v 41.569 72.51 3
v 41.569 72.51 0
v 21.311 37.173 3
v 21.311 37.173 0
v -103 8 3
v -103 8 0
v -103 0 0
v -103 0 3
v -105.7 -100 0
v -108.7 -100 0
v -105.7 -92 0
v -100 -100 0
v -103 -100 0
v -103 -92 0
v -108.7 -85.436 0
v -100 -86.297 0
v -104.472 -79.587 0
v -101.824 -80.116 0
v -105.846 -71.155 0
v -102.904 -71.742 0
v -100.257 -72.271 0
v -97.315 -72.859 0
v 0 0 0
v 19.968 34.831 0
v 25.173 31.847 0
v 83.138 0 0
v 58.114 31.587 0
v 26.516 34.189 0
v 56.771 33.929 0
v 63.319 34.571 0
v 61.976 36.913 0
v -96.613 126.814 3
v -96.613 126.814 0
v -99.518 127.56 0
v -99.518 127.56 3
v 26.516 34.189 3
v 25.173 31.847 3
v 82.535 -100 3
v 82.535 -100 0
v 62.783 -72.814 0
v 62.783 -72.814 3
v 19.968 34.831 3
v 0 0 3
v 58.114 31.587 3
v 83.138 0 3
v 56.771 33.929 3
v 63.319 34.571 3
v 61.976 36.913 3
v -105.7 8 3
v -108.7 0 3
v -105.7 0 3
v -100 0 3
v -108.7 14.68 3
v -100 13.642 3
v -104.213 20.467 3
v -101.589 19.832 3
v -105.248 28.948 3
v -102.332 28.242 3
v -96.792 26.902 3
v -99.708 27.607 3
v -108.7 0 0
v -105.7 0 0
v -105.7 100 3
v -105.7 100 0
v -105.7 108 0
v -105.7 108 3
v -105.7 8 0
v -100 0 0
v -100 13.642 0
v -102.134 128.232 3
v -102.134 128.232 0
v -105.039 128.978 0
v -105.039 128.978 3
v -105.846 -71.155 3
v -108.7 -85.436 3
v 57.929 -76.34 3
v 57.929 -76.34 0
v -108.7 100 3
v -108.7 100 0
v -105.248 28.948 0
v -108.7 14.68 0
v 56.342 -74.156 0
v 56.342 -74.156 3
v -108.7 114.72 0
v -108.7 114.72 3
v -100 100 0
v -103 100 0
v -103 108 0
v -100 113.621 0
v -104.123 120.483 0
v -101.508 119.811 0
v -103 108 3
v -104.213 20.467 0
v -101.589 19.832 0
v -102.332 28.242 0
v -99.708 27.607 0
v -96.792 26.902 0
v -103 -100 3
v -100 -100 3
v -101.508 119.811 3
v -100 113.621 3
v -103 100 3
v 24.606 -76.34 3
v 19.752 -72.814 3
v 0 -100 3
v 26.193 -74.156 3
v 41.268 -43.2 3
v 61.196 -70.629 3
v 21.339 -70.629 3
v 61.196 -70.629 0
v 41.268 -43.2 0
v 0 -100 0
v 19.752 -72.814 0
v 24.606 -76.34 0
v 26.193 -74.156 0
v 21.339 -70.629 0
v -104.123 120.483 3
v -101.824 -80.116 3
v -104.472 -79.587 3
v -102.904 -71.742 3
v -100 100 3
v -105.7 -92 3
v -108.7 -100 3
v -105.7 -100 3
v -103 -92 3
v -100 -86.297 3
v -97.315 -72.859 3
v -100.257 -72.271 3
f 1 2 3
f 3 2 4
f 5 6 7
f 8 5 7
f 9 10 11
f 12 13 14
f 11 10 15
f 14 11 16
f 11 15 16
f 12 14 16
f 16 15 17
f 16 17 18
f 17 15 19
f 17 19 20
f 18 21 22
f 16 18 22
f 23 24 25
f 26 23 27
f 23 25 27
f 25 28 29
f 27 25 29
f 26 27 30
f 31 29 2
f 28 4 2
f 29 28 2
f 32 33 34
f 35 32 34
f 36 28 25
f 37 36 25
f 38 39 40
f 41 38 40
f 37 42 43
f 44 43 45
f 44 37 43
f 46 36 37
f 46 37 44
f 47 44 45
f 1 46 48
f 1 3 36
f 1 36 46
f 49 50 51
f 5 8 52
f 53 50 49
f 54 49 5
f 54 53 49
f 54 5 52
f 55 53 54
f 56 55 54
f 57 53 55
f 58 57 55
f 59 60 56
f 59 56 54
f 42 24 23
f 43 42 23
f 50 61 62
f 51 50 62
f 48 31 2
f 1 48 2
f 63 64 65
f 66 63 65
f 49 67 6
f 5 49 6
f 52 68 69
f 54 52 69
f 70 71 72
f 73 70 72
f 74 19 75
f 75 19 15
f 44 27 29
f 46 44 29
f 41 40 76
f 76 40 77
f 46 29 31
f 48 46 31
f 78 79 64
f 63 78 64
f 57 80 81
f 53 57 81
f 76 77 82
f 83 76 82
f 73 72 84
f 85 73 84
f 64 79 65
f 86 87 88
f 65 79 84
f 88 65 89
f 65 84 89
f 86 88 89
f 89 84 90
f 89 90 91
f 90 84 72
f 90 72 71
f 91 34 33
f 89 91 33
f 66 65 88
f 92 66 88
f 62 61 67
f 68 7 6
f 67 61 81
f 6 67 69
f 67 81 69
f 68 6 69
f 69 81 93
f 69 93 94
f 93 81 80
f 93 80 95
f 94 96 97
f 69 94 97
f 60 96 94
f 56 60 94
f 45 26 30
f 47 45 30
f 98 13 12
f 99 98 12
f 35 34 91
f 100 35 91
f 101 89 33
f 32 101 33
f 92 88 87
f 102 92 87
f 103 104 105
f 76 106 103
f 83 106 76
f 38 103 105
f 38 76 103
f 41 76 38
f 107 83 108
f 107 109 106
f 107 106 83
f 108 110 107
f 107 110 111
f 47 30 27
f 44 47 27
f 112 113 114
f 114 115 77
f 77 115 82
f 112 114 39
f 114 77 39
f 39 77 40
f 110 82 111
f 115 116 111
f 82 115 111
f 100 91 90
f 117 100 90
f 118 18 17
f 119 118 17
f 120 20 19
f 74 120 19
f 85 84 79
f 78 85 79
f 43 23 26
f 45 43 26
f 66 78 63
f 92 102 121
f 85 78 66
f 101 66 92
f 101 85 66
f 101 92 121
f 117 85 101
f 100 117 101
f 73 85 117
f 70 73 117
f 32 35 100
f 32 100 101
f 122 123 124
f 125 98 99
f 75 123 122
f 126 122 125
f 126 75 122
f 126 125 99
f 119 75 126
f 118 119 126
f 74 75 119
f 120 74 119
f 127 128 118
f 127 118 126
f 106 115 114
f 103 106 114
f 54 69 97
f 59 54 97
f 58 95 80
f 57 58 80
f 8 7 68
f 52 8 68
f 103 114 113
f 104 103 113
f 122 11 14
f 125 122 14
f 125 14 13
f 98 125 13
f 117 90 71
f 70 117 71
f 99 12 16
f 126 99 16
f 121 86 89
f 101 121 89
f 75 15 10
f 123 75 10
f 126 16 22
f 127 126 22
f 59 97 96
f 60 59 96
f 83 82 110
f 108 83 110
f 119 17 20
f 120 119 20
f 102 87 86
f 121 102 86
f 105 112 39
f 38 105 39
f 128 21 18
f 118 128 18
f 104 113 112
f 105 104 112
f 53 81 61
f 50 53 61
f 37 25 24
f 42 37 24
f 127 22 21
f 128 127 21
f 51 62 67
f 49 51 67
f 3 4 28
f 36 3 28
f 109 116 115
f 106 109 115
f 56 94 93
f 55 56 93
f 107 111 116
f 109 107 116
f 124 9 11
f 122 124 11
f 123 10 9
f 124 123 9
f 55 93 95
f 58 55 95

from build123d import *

# Parameters (mm, degrees)
F2_DEPTH  = 3
F4_DEPTH  = 3
F6_DEPTH  = 3
F8_DEPTH  = 3
F10_DEPTH = 3


with BuildPart() as f2:
    # F1 (on Top) → F2 (new body)
    with BuildSketch(Plane.XY):
        Polygon((19.968103654, 34.8310246878), (0, 0), (83.137789281, 0), (63.3188913913, 34.5707601304), (58.1136002415, 31.5866448435), (56.7707483624, 33.9290258609), (61.9760395122, 36.9131411478), (41.5688946405, 72.509999976), (21.3109555331, 37.1734057053), (26.5162466829, 34.1892904184), (25.1733948038, 31.846909401), align=None)
    extrude(amount=F2_DEPTH)


with BuildPart() as f4:
    # F3 (on Top) → F4 (new body)
    with BuildSketch(Plane.XY):
        Polygon((19.7521299169, -72.8135254916), (0, -100), (82.5352311814, -100), (62.7831012645, -72.8135254916), (57.9289992982, -76.3402370053), (56.3419791171, -74.1558911205), (61.1960810833, -70.6291796067), (41.2676155907, -43.2), (21.3391500981, -70.6291796068), (26.1932520644, -74.1558911205), (24.6062318832, -76.3402370053), align=None)
    extrude(amount=F4_DEPTH)


with BuildPart() as f6:
    # F5 (on Top) → F6 (new body)
    with BuildSketch(Plane.XY):
        Polygon((-103, 0), (-100, 0), (-100, 13.642271658), (-96.7921274148, 26.9020276688), (-99.7080104166, 27.6074540081), (-101.5891473214, 19.8317660035), (-104.2134420229, 20.4666497088), (-102.3323051181, 28.2423377135), (-105.2481881199, 28.9477640528), (-108.7, 14.6796838499), (-108.7, 0), (-105.7, 0), (-105.7, 8), (-103, 8), align=None)
    extrude(amount=F6_DEPTH)


with BuildPart() as f8:
    # F7 (on Top) → F8 (new body)
    with BuildSketch(Plane.XY):
        Polygon((-103, -100), (-100, -100), (-100, -86.2967959619), (-97.314910005, -72.8592332131), (-100.2567539806, -72.2713947803), (-101.8243231345, -80.1163120487), (-104.4719827126, -79.5872574593), (-102.9044135587, -71.7423401909), (-105.8462575343, -71.1545017582), (-108.7, -85.4360876724), (-108.7, -100), (-105.7, -100), (-105.7, -92), (-103, -92), align=None)
    extrude(amount=F8_DEPTH)


with BuildPart() as f10:
    # F9 (on Top) → F10 (new body)
    with BuildSketch(Plane.XY):
        Polygon((-103, 100), (-100, 100), (-100, 113.6210118647), (-96.6125920963, 126.8140945943), (-99.5183415797, 127.5601642558), (-101.507860677, 119.8114989668), (-104.1230352121, 120.4829616621), (-102.1335161147, 128.2316269511), (-105.0392655981, 128.9776966126), (-108.7, 114.7200774571), (-108.7, 100), (-105.7, 100), (-105.7, 108), (-103, 108), align=None)
    extrude(amount=F10_DEPTH)


solid = Compound([f2.part, f4.part, f6.part, f8.part, f10.part])
